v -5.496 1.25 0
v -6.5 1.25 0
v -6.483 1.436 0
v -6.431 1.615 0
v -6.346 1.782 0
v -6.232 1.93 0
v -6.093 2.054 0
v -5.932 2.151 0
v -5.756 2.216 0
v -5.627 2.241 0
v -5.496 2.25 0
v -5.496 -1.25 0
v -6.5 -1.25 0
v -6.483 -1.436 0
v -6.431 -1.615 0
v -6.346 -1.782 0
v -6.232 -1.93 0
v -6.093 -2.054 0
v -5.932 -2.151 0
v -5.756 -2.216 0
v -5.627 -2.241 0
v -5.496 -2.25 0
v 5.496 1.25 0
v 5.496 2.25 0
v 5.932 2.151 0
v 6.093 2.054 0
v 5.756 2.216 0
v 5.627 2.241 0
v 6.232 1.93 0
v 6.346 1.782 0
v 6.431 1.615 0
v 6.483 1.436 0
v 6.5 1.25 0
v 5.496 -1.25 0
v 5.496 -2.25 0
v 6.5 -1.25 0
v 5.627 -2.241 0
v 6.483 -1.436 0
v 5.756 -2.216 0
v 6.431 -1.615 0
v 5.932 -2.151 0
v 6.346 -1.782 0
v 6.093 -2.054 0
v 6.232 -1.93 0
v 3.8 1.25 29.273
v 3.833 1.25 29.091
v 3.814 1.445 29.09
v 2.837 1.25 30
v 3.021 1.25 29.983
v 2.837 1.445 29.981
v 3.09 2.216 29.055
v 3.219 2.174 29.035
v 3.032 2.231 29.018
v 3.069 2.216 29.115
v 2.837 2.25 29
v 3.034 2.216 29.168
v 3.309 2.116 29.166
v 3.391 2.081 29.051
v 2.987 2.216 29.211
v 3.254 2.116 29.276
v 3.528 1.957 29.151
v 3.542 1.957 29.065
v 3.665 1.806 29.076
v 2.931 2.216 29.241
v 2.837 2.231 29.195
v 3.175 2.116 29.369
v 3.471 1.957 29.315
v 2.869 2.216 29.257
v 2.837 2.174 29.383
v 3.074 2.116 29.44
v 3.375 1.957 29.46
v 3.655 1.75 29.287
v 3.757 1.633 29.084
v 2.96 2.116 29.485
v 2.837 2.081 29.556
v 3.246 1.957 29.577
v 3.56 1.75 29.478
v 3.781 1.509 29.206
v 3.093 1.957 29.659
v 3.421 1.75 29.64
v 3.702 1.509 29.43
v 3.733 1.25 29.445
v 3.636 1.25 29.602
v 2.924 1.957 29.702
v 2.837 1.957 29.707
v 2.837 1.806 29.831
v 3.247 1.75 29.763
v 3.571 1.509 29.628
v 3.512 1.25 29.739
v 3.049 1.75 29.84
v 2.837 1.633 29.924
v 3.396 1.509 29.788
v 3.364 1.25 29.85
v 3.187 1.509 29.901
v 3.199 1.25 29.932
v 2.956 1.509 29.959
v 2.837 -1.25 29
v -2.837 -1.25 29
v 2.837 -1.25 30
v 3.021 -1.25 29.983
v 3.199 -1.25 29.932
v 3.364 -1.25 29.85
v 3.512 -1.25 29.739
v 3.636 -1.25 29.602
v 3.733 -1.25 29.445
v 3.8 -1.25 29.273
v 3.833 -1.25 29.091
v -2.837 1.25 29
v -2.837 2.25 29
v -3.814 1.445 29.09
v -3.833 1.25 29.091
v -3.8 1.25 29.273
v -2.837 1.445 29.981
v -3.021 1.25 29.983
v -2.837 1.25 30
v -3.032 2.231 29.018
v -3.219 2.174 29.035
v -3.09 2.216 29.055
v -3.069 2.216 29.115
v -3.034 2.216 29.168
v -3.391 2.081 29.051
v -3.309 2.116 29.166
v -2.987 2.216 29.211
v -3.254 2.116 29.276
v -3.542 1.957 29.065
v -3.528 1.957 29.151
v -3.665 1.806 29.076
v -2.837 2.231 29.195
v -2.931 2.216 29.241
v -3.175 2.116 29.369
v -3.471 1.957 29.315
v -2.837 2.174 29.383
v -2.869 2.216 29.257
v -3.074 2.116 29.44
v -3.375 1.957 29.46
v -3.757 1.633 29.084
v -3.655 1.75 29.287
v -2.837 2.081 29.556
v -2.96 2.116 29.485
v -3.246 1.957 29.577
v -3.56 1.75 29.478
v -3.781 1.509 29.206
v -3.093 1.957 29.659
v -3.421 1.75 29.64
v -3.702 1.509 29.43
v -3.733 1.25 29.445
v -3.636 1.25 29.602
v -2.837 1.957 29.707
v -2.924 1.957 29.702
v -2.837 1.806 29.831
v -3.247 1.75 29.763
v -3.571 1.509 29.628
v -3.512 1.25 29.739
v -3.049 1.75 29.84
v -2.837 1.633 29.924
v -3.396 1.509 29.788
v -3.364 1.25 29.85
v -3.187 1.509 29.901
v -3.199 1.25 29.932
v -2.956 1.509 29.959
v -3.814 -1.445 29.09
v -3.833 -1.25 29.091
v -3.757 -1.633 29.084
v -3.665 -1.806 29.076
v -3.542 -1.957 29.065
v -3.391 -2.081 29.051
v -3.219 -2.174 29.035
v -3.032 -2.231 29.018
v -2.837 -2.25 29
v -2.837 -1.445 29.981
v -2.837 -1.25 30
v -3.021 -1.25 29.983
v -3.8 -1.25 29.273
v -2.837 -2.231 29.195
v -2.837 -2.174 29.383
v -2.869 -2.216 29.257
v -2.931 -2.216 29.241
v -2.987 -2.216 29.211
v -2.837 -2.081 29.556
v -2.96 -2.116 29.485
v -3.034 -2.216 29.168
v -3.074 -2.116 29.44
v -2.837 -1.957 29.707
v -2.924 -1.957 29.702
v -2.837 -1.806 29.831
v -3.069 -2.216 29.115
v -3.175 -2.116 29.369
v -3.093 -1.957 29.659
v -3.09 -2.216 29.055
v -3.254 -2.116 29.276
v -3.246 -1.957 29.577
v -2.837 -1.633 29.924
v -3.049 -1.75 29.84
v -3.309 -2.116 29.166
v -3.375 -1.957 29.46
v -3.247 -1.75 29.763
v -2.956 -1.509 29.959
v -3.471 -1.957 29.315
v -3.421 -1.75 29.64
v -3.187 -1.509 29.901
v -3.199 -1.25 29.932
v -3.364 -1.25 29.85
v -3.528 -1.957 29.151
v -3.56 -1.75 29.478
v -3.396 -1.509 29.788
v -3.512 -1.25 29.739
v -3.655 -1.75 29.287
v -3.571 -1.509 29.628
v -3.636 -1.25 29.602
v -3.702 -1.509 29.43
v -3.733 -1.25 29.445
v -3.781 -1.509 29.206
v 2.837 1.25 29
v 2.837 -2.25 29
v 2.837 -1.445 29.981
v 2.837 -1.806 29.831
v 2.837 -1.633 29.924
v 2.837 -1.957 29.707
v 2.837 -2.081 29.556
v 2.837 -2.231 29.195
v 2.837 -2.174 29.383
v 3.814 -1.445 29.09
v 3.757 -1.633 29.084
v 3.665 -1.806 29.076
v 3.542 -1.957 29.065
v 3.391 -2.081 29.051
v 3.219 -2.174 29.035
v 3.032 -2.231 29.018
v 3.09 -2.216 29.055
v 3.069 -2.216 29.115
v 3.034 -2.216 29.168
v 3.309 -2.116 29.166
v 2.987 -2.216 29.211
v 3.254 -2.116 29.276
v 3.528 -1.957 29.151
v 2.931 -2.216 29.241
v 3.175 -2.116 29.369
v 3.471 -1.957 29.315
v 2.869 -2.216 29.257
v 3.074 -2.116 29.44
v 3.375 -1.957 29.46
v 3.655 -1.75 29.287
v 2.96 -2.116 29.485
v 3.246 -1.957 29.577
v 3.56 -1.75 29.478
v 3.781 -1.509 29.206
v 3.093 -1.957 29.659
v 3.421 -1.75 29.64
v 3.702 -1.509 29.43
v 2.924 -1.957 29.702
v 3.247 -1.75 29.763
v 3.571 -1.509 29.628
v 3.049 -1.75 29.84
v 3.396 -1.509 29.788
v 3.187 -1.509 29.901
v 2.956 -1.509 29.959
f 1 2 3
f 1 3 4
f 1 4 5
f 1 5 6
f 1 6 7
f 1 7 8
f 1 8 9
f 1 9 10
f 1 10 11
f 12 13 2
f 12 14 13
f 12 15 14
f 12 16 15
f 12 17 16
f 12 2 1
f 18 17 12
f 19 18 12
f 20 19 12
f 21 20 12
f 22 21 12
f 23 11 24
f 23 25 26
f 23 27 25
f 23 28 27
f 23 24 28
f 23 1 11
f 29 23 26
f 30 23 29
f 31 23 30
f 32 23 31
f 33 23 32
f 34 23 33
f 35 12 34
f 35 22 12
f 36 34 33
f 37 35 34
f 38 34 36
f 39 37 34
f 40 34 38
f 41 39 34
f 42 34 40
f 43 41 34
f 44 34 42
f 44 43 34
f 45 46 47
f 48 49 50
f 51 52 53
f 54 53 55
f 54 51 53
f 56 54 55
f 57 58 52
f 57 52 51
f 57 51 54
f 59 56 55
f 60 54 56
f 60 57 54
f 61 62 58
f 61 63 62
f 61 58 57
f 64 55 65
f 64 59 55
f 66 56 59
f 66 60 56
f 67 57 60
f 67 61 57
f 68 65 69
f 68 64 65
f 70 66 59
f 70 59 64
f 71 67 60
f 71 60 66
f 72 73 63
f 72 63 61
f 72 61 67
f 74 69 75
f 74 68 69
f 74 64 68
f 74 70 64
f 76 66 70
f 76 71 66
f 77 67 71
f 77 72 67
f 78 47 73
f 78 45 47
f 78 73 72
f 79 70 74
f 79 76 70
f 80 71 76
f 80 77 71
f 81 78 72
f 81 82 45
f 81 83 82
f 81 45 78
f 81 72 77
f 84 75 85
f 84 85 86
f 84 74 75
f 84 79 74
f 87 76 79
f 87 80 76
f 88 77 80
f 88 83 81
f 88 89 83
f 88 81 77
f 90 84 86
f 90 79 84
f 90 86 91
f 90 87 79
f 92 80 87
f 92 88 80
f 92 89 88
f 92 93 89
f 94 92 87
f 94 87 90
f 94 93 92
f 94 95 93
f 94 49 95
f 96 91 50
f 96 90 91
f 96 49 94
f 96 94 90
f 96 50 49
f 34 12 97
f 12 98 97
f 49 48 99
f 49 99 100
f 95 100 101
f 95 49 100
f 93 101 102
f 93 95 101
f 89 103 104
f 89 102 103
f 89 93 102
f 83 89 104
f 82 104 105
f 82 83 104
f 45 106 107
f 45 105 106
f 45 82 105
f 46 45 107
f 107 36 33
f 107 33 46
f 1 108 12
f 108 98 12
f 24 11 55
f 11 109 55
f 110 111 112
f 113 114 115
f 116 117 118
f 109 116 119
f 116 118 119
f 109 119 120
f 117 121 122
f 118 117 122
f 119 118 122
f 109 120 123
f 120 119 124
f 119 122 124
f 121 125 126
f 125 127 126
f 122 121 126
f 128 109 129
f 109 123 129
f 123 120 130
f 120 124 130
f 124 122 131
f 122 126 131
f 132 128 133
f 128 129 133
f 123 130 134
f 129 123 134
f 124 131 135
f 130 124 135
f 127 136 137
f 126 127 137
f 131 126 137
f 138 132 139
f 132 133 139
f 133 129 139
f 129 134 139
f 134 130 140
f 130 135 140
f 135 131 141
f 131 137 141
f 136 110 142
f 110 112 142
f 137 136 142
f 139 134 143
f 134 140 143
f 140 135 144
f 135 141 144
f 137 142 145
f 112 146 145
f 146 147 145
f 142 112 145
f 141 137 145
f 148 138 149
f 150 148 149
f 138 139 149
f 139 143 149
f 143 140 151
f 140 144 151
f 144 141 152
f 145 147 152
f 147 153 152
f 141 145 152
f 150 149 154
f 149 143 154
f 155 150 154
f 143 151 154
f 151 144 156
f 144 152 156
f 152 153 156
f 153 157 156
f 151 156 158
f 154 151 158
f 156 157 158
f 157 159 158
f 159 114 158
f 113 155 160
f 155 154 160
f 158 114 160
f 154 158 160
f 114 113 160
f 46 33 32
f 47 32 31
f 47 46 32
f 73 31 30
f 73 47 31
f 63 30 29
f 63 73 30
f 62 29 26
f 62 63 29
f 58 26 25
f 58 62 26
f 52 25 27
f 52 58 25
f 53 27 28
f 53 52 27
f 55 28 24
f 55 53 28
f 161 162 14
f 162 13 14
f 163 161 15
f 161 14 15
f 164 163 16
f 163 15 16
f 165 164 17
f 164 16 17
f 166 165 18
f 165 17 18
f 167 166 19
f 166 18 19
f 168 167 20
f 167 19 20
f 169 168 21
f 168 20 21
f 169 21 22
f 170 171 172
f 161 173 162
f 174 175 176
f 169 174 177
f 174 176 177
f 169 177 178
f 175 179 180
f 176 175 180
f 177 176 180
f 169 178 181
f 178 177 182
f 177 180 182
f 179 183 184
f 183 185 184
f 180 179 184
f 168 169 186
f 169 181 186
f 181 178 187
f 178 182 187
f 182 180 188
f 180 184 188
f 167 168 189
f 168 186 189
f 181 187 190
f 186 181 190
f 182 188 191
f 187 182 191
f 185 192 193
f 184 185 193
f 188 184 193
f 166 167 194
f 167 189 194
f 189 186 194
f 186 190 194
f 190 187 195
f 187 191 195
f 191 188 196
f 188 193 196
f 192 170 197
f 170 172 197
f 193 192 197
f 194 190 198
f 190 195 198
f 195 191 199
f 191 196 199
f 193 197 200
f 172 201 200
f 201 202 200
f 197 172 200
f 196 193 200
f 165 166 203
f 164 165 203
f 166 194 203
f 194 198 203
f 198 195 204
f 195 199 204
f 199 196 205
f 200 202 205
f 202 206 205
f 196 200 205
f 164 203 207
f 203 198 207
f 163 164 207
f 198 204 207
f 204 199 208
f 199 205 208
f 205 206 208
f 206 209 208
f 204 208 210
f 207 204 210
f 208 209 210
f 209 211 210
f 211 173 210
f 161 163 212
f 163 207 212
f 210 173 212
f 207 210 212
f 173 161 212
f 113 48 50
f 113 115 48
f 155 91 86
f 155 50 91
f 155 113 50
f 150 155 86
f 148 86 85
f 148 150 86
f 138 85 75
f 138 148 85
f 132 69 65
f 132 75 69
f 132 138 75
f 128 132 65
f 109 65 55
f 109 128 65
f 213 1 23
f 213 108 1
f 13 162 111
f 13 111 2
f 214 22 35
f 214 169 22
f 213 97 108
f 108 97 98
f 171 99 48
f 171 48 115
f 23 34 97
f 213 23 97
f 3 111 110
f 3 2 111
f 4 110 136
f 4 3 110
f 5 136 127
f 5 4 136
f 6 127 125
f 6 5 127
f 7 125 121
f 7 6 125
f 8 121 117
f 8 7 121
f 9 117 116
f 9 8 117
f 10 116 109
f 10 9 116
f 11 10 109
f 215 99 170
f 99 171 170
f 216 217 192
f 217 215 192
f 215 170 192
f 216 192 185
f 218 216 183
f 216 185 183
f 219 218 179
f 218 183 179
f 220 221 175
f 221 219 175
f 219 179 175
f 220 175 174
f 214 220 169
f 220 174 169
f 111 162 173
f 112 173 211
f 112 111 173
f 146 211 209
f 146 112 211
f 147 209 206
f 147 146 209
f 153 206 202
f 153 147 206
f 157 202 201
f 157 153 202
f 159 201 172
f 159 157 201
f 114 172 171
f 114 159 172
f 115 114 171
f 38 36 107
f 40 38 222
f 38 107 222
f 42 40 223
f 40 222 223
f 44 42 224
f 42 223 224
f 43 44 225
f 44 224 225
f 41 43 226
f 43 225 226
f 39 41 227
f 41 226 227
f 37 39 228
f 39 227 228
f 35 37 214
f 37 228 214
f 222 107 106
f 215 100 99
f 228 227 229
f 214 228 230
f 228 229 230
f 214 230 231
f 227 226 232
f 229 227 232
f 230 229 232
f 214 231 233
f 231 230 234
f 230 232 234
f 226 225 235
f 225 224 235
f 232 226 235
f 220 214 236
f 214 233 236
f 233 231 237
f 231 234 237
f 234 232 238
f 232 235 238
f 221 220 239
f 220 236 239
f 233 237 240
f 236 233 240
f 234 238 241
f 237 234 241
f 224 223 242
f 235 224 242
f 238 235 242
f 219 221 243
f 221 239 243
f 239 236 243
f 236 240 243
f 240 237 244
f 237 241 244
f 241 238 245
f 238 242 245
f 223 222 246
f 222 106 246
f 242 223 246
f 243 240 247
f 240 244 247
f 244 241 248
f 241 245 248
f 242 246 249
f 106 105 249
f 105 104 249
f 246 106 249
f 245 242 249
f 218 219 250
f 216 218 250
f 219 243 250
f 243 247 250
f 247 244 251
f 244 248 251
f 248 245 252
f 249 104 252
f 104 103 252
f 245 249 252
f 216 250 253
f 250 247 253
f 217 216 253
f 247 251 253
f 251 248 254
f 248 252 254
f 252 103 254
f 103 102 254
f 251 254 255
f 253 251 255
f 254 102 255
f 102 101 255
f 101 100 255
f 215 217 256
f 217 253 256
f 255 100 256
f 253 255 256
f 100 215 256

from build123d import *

# Parameters (mm, degrees)
F1_DEPTH = 2.25
F2_R     = 1
F3_T     = 1


# Not quite as in the source:
# - a shell that OpenCascade refuses in one call is made with other operations: the cavity is built on its own and cut out


with BuildPart() as f1:
    # F0 (on Front) → F1 (new body, symmetric)
    with BuildSketch(Plane.XZ):
        Polygon((-3.75, 30), (-6.5, 0), (6.5, 0), (3.75, 30), align=None)
    extrude(amount=F1_DEPTH, both=True)

    # F2
    f2_edges = [f1.edges().sort_by_distance(p)[0] for p in [
        (-3.75, 0, 30),
        (3.75, 0, 30),
        (5.125, -2.25, 15),
        (0, -2.25, 30),
        (-5.125, -2.25, 15),
        (-5.125, 2.25, 15),
        (5.125, 2.25, 15),
        (0, 2.25, 30),
    ]]
    fillet(f2_edges, radius=F2_R)

    # F3: shell of thickness 1, made by hand


with BuildPart() as f3_core1:
    # F3_t2: copy of F1
    add(f1.part)

    # the walls: a layer under each face that stays
    f3_faces = [f3_core1.faces().sort_by_distance(p)[0] for p in [
        (-5.1666494856, 0, 14.5456419748),
        (0, 2.25, 14.5),
        (0, -2.25, 14.5),
        (5.1666494856, 0, 14.5456419748),
        (0, 0, 30),
    ]]
    thicken(f3_faces, amount=-F3_T, mode=Mode.SUBTRACT)


with BuildPart() as f1_1:
    add(f1.part)

    # what is left inside the walls is the cavity
    f3_cavity = [f3_core1.part.solids().sort_by_distance(p)[0] for p in [
        (0, -1.24, 9.666667),
    ]]
    add(f3_cavity, mode=Mode.SUBTRACT)


solid = f1_1.part
